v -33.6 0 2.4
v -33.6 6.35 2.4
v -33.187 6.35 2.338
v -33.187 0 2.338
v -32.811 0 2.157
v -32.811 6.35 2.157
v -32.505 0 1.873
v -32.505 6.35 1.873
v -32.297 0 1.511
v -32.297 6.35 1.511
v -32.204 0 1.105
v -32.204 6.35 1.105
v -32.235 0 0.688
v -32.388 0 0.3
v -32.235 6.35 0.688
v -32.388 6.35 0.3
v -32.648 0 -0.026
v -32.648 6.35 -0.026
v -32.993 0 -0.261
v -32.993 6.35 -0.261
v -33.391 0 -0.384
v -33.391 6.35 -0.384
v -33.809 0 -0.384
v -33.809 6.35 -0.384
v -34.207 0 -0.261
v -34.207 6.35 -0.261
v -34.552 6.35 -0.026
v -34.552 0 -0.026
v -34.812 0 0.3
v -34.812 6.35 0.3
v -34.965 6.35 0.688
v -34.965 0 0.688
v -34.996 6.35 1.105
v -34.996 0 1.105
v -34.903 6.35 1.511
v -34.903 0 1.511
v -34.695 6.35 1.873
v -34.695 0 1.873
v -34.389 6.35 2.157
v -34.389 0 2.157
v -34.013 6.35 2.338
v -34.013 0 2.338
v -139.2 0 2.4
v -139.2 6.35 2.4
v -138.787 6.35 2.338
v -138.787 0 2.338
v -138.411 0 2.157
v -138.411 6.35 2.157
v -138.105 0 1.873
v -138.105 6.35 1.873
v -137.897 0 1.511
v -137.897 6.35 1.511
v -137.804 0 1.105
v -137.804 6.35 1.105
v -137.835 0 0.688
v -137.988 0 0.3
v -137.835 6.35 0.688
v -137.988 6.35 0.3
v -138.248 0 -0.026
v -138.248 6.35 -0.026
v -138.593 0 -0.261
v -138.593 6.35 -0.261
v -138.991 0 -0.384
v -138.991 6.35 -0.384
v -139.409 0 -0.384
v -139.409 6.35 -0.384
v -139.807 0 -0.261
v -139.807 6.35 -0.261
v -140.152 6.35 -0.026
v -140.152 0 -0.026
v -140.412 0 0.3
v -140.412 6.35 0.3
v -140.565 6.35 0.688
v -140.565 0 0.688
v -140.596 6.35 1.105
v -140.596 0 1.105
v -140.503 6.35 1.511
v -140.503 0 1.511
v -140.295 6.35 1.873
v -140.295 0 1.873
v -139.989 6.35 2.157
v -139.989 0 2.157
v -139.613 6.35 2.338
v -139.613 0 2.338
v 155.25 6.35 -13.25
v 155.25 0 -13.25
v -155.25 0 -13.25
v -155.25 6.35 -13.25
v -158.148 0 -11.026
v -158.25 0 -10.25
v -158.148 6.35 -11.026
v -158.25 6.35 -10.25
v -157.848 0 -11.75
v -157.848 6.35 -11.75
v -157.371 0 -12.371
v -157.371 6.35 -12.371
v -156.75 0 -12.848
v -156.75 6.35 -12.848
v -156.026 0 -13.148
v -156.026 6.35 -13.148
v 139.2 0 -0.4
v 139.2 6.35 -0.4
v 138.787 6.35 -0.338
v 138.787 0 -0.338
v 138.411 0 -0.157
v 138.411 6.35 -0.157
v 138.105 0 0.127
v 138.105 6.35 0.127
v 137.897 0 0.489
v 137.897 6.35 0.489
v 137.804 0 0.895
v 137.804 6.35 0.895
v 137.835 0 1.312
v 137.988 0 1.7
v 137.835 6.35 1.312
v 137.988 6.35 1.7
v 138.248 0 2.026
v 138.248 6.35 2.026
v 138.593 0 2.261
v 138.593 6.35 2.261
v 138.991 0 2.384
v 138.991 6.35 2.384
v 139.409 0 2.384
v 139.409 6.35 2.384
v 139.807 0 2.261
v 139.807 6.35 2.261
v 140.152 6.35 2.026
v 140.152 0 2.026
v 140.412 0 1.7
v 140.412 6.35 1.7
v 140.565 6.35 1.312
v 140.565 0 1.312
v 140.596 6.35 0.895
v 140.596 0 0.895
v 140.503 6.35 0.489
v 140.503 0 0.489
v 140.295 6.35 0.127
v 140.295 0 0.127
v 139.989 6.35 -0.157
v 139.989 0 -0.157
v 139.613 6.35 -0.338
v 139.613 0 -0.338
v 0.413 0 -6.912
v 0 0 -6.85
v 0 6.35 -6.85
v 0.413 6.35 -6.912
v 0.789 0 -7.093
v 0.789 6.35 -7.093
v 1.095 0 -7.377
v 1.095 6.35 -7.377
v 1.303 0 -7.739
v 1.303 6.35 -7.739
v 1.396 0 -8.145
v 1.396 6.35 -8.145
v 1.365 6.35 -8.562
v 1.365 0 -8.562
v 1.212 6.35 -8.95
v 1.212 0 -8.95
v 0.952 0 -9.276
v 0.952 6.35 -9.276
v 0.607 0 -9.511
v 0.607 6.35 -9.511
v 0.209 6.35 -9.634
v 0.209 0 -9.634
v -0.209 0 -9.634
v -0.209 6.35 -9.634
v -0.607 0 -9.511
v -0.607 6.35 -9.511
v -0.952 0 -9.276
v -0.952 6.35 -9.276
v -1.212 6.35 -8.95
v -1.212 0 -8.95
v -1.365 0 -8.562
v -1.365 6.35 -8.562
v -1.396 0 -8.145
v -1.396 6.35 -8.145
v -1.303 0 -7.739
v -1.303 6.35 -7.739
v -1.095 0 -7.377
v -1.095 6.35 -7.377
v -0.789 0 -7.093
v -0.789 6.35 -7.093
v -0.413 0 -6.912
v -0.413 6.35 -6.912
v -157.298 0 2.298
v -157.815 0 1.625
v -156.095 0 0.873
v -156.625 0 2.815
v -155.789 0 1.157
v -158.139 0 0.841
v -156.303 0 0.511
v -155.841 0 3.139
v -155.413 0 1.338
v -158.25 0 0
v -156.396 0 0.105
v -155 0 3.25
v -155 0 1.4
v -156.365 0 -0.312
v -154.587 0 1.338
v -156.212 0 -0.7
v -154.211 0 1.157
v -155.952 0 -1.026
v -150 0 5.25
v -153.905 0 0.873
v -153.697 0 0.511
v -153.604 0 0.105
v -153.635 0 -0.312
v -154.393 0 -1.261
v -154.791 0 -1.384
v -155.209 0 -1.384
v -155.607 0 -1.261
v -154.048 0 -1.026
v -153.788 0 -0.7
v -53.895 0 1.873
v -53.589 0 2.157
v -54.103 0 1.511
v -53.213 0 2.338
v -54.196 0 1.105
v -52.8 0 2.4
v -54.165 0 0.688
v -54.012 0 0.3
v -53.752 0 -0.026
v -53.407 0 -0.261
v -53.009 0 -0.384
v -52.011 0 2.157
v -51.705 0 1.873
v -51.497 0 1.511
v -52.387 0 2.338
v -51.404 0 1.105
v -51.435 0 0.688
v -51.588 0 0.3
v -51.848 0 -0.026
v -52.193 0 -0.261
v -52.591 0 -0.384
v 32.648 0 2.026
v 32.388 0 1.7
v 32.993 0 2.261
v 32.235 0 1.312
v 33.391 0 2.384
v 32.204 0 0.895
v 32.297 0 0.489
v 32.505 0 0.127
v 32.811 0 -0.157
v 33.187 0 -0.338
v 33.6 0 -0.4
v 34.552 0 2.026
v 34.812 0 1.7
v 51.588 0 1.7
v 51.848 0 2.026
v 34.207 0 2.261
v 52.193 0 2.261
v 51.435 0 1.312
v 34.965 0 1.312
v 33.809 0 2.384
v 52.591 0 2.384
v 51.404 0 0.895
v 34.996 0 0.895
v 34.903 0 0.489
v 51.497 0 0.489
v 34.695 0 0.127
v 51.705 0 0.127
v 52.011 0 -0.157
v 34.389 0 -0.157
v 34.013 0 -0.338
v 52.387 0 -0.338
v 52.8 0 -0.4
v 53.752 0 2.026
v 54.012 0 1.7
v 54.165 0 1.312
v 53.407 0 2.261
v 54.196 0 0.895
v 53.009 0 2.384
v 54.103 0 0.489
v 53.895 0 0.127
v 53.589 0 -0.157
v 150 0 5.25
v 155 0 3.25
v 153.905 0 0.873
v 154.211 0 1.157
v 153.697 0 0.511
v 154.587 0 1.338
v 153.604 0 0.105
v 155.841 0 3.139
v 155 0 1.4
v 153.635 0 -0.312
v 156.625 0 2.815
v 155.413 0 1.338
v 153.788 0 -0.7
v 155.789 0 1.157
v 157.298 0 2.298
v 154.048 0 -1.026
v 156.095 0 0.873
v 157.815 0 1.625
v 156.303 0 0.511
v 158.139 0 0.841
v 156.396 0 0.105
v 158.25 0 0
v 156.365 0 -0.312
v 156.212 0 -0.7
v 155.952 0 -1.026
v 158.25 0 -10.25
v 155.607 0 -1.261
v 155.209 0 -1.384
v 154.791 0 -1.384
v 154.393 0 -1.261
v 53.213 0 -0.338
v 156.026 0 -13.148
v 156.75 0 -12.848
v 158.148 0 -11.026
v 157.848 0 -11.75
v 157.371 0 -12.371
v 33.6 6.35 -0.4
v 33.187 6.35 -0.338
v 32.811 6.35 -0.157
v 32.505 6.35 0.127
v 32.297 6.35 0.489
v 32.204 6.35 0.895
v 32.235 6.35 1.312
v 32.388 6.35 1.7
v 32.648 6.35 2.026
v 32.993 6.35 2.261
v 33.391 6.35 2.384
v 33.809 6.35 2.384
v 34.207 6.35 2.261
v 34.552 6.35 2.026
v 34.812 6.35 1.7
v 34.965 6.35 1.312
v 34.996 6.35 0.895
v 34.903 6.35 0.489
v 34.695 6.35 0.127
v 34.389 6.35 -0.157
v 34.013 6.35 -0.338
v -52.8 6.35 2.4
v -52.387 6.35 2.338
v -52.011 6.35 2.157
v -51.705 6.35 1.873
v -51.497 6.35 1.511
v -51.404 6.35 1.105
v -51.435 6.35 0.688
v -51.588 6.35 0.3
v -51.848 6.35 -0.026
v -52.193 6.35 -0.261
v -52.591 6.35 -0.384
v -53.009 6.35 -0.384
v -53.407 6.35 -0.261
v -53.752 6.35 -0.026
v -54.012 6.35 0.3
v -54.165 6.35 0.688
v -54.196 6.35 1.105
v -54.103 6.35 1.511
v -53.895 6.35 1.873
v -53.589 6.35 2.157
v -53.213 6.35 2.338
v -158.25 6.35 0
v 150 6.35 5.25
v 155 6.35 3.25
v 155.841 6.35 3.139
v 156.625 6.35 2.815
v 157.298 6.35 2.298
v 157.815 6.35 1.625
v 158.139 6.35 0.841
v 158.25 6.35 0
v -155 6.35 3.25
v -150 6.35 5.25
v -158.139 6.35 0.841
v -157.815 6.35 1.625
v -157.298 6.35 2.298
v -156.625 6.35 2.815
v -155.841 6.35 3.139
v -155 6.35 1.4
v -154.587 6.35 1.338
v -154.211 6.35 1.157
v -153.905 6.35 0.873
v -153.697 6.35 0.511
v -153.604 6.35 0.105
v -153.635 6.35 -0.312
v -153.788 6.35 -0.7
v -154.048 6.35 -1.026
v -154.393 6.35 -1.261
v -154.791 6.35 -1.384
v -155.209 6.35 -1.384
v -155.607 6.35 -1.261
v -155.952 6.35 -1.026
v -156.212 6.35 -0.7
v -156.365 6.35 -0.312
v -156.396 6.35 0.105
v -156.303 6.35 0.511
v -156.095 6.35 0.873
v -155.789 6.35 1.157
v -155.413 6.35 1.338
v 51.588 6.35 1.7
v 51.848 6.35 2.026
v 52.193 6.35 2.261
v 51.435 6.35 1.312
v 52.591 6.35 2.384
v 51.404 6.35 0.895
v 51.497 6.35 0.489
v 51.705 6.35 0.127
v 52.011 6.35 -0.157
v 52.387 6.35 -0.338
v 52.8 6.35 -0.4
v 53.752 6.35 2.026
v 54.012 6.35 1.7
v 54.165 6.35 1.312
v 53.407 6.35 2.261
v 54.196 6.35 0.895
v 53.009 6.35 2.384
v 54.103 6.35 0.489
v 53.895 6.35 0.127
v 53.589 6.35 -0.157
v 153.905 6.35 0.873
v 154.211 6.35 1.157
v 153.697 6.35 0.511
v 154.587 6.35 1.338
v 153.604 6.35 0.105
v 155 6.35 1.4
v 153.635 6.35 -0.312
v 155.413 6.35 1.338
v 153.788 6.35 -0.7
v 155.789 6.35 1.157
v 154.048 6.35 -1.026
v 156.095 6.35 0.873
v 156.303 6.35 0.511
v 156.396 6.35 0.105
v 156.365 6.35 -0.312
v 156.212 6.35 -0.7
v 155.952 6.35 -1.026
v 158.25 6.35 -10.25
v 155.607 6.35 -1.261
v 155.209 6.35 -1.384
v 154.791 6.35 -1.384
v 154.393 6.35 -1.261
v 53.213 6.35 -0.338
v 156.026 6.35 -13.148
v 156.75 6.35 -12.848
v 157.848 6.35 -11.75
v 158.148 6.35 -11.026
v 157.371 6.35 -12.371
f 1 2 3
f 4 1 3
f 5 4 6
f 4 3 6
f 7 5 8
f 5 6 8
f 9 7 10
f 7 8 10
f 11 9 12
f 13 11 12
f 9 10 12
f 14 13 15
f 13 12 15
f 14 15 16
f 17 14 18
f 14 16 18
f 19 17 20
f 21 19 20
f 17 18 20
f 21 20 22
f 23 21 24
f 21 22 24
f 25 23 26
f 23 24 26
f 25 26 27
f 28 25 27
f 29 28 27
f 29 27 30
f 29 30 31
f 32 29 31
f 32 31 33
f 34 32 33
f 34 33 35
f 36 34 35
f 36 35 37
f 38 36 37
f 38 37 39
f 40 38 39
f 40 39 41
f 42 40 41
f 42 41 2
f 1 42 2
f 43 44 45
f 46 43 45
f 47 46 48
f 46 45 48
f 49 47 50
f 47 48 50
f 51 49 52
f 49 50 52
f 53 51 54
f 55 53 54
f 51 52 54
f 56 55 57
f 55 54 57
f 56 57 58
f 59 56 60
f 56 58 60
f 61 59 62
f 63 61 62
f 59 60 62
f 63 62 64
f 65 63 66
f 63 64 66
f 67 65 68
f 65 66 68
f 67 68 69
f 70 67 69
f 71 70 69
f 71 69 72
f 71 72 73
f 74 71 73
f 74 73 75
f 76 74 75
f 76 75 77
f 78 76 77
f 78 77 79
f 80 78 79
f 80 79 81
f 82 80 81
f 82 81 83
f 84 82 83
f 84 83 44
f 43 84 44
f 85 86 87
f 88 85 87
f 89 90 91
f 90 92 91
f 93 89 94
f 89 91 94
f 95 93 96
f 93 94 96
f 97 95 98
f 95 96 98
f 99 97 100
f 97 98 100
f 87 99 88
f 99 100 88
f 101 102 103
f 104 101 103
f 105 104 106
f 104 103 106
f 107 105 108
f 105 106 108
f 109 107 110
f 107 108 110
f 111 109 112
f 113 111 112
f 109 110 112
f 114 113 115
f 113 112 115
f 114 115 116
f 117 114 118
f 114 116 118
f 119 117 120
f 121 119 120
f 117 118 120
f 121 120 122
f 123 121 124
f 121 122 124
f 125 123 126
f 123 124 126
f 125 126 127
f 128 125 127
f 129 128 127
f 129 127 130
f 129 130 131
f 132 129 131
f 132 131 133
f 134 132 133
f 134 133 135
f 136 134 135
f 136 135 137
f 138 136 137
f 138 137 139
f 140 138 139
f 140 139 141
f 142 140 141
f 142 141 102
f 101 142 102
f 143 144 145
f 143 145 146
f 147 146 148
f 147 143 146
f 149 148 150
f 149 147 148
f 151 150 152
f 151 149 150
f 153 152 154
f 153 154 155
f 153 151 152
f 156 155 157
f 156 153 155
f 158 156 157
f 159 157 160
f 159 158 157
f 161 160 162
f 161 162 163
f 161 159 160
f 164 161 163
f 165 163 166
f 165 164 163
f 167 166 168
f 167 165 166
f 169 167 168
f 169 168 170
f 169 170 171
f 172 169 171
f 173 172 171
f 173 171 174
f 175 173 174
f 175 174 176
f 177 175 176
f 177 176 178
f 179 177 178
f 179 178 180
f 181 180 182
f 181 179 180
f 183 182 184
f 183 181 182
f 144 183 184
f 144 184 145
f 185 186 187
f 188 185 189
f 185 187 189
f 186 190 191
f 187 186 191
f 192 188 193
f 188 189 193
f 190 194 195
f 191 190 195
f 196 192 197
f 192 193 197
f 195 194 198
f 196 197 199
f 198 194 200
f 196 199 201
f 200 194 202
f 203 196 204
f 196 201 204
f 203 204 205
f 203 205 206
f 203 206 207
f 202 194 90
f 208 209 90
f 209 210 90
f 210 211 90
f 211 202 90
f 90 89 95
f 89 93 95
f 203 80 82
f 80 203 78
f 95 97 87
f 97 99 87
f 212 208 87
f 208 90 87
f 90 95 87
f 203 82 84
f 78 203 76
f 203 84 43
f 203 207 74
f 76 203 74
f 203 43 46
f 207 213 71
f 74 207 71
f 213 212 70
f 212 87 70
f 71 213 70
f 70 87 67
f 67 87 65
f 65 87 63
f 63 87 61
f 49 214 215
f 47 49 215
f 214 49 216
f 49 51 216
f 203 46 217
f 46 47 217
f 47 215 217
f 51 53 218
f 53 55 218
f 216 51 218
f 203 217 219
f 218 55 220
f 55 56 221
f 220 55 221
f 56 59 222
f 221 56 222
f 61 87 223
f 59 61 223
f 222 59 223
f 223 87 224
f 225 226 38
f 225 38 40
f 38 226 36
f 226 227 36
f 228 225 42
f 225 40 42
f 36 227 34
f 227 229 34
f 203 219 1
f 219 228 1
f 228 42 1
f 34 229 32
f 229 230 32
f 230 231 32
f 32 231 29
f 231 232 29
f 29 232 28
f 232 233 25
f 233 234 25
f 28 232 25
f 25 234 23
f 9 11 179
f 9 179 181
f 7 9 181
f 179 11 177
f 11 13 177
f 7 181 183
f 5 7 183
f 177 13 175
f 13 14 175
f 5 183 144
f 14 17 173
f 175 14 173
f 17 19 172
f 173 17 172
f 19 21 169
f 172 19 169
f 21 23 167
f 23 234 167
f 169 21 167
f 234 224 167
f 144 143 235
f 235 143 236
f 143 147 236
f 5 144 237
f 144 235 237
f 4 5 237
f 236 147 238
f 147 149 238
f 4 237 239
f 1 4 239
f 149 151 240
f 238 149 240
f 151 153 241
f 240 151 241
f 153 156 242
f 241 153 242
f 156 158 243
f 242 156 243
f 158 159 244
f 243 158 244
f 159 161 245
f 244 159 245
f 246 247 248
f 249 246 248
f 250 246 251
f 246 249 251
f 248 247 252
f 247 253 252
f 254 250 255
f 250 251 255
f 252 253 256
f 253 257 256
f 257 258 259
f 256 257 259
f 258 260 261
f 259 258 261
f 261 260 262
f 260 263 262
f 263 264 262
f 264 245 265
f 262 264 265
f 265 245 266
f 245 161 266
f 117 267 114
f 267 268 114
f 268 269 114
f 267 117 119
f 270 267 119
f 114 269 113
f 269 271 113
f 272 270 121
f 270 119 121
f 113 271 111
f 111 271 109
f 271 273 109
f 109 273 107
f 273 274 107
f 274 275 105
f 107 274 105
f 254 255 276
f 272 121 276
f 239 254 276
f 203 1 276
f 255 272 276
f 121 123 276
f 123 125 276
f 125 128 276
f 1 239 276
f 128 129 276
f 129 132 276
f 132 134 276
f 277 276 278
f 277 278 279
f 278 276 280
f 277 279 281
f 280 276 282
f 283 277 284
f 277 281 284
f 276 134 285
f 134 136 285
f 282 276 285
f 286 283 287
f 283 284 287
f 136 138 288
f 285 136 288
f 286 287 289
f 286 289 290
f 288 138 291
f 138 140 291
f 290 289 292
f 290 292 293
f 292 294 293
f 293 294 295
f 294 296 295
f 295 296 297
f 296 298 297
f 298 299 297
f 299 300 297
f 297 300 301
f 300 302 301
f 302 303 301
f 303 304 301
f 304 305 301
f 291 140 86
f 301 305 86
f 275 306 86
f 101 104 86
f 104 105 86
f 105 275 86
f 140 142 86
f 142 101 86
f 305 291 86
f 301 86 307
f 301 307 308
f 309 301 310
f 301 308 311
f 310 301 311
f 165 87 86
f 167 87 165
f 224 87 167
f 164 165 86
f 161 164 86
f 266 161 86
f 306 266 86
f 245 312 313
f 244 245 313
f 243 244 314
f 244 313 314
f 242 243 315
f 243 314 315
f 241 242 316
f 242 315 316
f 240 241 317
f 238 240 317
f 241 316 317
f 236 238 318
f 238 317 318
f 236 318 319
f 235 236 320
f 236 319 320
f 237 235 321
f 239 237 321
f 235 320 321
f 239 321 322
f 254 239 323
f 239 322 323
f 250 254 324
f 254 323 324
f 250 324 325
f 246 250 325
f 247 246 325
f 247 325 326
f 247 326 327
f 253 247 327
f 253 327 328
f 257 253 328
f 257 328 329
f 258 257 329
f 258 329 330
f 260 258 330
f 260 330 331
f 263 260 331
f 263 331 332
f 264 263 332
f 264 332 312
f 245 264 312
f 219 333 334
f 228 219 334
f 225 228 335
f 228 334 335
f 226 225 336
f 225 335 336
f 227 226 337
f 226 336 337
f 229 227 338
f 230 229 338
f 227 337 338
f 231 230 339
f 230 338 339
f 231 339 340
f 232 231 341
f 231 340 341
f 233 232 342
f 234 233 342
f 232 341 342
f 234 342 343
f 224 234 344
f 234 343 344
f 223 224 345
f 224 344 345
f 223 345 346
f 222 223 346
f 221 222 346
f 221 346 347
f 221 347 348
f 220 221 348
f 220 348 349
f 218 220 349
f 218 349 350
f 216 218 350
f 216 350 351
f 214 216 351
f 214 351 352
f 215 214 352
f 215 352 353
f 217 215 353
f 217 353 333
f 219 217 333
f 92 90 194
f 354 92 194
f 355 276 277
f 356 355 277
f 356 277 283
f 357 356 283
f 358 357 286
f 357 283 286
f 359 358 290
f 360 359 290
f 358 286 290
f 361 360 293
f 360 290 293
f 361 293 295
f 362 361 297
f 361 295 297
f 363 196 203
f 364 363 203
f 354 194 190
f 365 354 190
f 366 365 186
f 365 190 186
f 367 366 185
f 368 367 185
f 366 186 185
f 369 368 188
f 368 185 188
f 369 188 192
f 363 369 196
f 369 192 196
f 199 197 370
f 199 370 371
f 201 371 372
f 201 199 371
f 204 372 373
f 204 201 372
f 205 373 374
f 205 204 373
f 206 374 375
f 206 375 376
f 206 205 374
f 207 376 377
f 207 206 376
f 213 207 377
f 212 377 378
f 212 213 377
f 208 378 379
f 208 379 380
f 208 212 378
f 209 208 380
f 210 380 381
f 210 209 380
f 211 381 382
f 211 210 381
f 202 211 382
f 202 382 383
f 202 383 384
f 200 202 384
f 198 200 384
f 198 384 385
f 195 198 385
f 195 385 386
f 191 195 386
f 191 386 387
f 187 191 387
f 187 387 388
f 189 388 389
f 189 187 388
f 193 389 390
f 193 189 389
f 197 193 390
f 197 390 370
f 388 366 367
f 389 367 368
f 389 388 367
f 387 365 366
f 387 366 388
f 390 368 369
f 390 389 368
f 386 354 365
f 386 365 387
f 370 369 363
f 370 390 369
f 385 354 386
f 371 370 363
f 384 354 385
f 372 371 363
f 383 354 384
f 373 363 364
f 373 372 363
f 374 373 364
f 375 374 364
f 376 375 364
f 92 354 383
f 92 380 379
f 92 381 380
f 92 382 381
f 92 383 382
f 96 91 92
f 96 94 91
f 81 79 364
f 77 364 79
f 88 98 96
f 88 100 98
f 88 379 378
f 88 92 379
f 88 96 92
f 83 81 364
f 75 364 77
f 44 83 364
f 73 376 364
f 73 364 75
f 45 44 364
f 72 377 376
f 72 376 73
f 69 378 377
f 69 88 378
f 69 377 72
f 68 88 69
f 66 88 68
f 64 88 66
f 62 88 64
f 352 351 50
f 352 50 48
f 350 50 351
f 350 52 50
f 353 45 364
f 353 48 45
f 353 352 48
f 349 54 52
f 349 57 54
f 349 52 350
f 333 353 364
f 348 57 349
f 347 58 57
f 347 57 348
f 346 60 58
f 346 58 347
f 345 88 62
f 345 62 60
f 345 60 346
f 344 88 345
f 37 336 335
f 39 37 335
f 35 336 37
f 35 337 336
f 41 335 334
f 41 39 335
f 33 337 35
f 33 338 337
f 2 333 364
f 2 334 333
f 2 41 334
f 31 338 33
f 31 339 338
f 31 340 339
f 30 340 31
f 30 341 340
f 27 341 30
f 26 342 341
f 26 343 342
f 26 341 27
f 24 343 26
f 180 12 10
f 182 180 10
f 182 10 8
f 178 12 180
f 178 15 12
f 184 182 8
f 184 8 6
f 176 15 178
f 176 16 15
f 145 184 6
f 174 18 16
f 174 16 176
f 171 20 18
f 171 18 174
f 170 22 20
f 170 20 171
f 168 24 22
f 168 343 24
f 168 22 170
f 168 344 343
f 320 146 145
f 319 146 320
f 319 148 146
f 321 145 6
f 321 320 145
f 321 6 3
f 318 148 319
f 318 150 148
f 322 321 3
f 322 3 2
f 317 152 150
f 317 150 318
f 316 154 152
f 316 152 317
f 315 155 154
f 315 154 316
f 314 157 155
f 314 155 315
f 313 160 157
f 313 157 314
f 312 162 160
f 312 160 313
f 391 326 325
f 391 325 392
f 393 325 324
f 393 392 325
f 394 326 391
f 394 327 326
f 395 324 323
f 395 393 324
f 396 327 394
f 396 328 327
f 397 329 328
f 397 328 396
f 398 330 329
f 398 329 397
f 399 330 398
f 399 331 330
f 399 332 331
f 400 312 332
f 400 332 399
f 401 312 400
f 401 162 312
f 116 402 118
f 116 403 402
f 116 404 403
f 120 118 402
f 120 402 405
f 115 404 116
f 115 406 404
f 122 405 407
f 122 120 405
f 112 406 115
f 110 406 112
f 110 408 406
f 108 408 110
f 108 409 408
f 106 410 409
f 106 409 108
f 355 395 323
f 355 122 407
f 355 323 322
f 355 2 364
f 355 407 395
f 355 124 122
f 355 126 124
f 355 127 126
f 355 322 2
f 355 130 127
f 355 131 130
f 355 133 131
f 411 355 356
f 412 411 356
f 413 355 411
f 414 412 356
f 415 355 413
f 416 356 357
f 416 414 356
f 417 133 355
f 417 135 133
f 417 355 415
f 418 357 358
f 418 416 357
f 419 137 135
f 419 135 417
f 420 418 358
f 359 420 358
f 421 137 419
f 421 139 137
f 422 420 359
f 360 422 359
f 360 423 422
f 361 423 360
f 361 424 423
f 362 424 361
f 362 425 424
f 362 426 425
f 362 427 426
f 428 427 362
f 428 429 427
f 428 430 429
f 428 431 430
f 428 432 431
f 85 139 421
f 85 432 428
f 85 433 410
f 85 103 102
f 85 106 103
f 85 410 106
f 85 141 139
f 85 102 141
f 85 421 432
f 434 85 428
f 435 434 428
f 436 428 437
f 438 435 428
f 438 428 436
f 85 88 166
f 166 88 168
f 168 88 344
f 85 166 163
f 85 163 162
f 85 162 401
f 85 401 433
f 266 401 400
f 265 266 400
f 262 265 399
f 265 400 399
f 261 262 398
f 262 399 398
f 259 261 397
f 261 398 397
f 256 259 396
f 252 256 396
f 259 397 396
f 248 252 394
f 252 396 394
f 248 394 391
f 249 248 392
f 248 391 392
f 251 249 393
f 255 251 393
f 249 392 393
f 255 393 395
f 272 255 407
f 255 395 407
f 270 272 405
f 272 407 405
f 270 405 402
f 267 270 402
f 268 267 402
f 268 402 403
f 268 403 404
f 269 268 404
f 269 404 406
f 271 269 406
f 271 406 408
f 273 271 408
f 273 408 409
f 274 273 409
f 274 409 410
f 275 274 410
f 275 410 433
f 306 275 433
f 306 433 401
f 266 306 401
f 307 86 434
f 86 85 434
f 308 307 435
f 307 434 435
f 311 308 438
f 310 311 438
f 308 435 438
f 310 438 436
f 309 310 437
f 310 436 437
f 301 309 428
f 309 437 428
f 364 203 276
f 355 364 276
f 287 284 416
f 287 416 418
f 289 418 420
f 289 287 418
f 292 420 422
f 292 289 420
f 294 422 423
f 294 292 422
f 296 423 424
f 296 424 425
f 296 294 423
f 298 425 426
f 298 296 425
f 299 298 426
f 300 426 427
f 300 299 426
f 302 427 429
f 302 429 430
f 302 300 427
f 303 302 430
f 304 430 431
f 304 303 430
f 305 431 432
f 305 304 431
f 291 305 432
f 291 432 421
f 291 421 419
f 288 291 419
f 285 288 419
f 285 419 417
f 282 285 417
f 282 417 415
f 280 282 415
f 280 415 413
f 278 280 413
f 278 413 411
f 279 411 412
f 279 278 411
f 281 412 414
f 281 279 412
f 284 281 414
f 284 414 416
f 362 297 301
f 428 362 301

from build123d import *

# Parameters (mm, degrees)
SKETCH1_R           = 1.4
BOSS_EXTRUDE1_DEPTH = 6.35
FILLET1_R           = 3
SKETCH2_R           = 1.4
CUT_EXTRUDE1_DEPTH  = 159.930637386


with BuildPart() as part:
    # Sketch1 → Boss-Extrude1 (new body)
    with BuildSketch(Plane(origin=(0, 0, 0), x_dir=(1, 0, 0), z_dir=(0, 1, 0))):
        with BuildLine():
            Line((-158.25, 13.25), (-158.25, 0))
            ThreePointArc((-158.25, 0), (-157.298097039, -2.298097039), (-155, -3.25))
            Line((-155, -3.25), (-150, -5.25))
            Line((-150, -5.25), (150, -5.25))
            Line((150, -5.25), (155, -3.25))
            ThreePointArc((155, -3.25), (157.298097039, -2.298097039), (158.25, 0))
            Line((158.25, 0), (158.25, 13.25))
            Line((158.25, 13.25), (-158.25, 13.25))
        make_face()
        with Locations(Location((155, 0, 0), (0, 0, 270))):
            Circle(SKETCH1_R, mode=Mode.SUBTRACT)
        with Locations(Location((-155, 0, 0), (0, 0, 270))):
            Circle(SKETCH1_R, mode=Mode.SUBTRACT)
        with Locations(Location((0, 8.25, 0), (0, 0, 270))):
            Circle(SKETCH1_R, mode=Mode.SUBTRACT)
    extrude(amount=BOSS_EXTRUDE1_DEPTH)

    # Fillet1
    fillet1_edges = [part.edges().sort_by_distance(p)[0] for p in [
        (-158.25, 3.175, -13.25),
        (158.25, 3.175, -13.25),
    ]]
    fillet(fillet1_edges, radius=FILLET1_R)

    # Sketch2 → Cut-Extrude1 (cut, through all)
    with BuildSketch(Plane(origin=(0, 6.35, 0), x_dir=(1, 0, 0), z_dir=(0, 1, 0))):
        with Locations(Location((-33.6, -1, 0), (0, 0, 270))):
            Circle(SKETCH2_R)
        with Locations(Location((-52.8, -1, 0), (0, 0, 270))):
            Circle(SKETCH2_R)
        with Locations(Location((-139.2, -1, 0), (0, 0, 270))):
            Circle(SKETCH2_R)
        with Locations(Location((139.2, -1, 0), (0, 0, 90))):
            Circle(SKETCH2_R)
        with Locations(Location((52.8, -1, 0), (0, 0, 90))):
            Circle(SKETCH2_R)
        with Locations(Location((33.6, -1, 0), (0, 0, 90))):
            Circle(SKETCH2_R)
    extrude(amount=-CUT_EXTRUDE1_DEPTH, mode=Mode.SUBTRACT)


solid = part.part
